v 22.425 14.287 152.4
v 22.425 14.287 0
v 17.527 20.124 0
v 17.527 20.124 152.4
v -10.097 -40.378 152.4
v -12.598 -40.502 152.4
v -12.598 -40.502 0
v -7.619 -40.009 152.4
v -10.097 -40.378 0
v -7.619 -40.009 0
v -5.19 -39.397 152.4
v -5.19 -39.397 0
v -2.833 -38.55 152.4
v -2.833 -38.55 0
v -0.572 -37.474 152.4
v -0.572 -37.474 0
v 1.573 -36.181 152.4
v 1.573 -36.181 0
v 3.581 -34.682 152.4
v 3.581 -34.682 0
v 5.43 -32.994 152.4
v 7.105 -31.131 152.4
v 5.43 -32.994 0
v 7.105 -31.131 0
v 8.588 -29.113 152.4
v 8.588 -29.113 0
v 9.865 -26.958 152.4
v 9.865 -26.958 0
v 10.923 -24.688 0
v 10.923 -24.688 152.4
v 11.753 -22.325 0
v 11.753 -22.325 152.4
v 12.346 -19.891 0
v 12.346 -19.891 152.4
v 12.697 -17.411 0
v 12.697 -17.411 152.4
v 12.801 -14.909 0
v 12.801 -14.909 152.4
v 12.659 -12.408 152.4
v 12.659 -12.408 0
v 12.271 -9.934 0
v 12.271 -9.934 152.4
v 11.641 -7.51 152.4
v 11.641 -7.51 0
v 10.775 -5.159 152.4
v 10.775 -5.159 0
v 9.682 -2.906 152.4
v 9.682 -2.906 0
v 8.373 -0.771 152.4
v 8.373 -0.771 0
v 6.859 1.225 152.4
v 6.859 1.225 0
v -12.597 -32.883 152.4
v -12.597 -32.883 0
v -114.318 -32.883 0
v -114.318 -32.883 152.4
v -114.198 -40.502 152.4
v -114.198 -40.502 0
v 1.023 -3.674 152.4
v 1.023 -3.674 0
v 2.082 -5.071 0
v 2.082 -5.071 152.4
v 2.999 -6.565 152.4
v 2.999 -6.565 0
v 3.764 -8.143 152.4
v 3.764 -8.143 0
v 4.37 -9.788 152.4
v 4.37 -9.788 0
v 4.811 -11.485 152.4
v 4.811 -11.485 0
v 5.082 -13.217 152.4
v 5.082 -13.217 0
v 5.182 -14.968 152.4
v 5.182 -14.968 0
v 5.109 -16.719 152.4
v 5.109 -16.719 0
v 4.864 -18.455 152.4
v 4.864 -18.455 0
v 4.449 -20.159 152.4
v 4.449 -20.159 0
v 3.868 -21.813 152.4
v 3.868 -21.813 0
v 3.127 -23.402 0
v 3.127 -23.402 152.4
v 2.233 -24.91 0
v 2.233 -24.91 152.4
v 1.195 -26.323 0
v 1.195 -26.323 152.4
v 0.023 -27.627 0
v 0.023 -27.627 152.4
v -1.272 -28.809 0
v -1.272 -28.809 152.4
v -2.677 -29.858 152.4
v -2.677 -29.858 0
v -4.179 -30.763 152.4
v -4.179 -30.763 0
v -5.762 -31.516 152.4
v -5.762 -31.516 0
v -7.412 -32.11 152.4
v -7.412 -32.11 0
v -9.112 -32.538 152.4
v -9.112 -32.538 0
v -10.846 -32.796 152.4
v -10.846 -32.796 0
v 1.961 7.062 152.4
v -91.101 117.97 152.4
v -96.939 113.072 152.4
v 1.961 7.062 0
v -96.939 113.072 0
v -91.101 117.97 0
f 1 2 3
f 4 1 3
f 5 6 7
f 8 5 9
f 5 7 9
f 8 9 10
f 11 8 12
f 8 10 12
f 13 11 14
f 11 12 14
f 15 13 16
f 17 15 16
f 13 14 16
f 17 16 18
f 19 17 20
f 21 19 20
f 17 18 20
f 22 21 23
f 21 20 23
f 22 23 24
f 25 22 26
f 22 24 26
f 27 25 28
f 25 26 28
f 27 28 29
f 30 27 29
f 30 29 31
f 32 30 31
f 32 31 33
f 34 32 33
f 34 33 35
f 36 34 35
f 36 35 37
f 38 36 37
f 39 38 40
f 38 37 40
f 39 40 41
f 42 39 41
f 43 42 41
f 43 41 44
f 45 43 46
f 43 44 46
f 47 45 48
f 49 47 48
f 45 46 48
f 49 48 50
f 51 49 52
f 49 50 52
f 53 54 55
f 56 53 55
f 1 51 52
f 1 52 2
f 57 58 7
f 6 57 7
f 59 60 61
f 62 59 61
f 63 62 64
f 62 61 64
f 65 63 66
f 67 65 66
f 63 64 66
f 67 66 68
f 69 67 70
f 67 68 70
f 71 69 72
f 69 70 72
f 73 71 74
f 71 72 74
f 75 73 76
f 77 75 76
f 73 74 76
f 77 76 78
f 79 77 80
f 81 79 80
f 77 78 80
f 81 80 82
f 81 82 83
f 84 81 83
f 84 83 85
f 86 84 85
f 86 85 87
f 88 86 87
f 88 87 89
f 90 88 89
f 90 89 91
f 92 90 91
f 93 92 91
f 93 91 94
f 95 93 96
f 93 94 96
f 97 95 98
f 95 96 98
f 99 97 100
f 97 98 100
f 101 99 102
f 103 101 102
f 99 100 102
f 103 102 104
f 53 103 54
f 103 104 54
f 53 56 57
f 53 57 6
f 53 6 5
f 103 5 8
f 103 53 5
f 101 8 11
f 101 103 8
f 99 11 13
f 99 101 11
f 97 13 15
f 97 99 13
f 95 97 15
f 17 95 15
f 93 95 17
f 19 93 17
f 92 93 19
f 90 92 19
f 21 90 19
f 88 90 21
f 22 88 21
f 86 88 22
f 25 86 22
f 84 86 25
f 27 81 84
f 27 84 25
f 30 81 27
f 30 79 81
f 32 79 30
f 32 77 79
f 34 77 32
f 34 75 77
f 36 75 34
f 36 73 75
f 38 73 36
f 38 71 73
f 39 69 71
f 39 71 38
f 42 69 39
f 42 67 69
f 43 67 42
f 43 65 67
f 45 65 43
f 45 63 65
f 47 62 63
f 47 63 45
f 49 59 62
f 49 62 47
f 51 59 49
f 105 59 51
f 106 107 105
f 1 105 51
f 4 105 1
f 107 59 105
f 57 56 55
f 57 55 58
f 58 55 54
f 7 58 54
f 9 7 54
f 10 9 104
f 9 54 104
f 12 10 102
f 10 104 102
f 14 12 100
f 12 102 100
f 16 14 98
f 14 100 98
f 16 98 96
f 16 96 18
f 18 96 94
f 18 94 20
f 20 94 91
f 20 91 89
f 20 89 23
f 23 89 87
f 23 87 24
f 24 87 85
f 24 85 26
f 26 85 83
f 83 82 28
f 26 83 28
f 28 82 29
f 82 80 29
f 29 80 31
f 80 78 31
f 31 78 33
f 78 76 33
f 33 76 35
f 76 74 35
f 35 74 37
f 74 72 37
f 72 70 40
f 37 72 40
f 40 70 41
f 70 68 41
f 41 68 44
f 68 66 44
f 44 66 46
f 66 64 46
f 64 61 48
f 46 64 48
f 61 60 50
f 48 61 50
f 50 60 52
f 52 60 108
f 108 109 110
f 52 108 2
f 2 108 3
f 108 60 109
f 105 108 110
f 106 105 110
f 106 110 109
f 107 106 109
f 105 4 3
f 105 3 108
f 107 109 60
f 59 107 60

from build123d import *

# Parameters (mm, degrees)
F1_DEPTH = 152.4


with BuildPart() as f1:
    # F0 (on Top) → F1 (new body)
    with BuildSketch(Plane.XY):
        with BuildLine():
            Line((-114.31821, -32.882527), (-114.198142, -40.501581))
            Line((-114.198142, -40.501581), (-12.598142, -40.501581))
            ThreePointArc((-12.598142, -40.501581), (10.422075, -25.836085), (6.859386, 1.225224))
            Line((6.859386, 1.225224), (22.425409, 14.286668))
            Line((22.425409, 14.286668), (17.527368, 20.123927))
            Line((17.527368, 20.123927), (1.961345, 7.062483))
            Line((1.961345, 7.062483), (-91.101445, 117.970397))
            Line((-91.101445, 117.970397), (-96.938704, 113.072356))
            Line((-96.938704, 113.072356), (1.022921, -3.673763))
            ThreePointArc((1.022921, -3.673763), (3.516804, -22.61668), (-12.597349, -32.882527))
            Line((-12.597349, -32.882527), (-114.31821, -32.882527))
        make_face()
    extrude(amount=F1_DEPTH)


solid = f1.part
